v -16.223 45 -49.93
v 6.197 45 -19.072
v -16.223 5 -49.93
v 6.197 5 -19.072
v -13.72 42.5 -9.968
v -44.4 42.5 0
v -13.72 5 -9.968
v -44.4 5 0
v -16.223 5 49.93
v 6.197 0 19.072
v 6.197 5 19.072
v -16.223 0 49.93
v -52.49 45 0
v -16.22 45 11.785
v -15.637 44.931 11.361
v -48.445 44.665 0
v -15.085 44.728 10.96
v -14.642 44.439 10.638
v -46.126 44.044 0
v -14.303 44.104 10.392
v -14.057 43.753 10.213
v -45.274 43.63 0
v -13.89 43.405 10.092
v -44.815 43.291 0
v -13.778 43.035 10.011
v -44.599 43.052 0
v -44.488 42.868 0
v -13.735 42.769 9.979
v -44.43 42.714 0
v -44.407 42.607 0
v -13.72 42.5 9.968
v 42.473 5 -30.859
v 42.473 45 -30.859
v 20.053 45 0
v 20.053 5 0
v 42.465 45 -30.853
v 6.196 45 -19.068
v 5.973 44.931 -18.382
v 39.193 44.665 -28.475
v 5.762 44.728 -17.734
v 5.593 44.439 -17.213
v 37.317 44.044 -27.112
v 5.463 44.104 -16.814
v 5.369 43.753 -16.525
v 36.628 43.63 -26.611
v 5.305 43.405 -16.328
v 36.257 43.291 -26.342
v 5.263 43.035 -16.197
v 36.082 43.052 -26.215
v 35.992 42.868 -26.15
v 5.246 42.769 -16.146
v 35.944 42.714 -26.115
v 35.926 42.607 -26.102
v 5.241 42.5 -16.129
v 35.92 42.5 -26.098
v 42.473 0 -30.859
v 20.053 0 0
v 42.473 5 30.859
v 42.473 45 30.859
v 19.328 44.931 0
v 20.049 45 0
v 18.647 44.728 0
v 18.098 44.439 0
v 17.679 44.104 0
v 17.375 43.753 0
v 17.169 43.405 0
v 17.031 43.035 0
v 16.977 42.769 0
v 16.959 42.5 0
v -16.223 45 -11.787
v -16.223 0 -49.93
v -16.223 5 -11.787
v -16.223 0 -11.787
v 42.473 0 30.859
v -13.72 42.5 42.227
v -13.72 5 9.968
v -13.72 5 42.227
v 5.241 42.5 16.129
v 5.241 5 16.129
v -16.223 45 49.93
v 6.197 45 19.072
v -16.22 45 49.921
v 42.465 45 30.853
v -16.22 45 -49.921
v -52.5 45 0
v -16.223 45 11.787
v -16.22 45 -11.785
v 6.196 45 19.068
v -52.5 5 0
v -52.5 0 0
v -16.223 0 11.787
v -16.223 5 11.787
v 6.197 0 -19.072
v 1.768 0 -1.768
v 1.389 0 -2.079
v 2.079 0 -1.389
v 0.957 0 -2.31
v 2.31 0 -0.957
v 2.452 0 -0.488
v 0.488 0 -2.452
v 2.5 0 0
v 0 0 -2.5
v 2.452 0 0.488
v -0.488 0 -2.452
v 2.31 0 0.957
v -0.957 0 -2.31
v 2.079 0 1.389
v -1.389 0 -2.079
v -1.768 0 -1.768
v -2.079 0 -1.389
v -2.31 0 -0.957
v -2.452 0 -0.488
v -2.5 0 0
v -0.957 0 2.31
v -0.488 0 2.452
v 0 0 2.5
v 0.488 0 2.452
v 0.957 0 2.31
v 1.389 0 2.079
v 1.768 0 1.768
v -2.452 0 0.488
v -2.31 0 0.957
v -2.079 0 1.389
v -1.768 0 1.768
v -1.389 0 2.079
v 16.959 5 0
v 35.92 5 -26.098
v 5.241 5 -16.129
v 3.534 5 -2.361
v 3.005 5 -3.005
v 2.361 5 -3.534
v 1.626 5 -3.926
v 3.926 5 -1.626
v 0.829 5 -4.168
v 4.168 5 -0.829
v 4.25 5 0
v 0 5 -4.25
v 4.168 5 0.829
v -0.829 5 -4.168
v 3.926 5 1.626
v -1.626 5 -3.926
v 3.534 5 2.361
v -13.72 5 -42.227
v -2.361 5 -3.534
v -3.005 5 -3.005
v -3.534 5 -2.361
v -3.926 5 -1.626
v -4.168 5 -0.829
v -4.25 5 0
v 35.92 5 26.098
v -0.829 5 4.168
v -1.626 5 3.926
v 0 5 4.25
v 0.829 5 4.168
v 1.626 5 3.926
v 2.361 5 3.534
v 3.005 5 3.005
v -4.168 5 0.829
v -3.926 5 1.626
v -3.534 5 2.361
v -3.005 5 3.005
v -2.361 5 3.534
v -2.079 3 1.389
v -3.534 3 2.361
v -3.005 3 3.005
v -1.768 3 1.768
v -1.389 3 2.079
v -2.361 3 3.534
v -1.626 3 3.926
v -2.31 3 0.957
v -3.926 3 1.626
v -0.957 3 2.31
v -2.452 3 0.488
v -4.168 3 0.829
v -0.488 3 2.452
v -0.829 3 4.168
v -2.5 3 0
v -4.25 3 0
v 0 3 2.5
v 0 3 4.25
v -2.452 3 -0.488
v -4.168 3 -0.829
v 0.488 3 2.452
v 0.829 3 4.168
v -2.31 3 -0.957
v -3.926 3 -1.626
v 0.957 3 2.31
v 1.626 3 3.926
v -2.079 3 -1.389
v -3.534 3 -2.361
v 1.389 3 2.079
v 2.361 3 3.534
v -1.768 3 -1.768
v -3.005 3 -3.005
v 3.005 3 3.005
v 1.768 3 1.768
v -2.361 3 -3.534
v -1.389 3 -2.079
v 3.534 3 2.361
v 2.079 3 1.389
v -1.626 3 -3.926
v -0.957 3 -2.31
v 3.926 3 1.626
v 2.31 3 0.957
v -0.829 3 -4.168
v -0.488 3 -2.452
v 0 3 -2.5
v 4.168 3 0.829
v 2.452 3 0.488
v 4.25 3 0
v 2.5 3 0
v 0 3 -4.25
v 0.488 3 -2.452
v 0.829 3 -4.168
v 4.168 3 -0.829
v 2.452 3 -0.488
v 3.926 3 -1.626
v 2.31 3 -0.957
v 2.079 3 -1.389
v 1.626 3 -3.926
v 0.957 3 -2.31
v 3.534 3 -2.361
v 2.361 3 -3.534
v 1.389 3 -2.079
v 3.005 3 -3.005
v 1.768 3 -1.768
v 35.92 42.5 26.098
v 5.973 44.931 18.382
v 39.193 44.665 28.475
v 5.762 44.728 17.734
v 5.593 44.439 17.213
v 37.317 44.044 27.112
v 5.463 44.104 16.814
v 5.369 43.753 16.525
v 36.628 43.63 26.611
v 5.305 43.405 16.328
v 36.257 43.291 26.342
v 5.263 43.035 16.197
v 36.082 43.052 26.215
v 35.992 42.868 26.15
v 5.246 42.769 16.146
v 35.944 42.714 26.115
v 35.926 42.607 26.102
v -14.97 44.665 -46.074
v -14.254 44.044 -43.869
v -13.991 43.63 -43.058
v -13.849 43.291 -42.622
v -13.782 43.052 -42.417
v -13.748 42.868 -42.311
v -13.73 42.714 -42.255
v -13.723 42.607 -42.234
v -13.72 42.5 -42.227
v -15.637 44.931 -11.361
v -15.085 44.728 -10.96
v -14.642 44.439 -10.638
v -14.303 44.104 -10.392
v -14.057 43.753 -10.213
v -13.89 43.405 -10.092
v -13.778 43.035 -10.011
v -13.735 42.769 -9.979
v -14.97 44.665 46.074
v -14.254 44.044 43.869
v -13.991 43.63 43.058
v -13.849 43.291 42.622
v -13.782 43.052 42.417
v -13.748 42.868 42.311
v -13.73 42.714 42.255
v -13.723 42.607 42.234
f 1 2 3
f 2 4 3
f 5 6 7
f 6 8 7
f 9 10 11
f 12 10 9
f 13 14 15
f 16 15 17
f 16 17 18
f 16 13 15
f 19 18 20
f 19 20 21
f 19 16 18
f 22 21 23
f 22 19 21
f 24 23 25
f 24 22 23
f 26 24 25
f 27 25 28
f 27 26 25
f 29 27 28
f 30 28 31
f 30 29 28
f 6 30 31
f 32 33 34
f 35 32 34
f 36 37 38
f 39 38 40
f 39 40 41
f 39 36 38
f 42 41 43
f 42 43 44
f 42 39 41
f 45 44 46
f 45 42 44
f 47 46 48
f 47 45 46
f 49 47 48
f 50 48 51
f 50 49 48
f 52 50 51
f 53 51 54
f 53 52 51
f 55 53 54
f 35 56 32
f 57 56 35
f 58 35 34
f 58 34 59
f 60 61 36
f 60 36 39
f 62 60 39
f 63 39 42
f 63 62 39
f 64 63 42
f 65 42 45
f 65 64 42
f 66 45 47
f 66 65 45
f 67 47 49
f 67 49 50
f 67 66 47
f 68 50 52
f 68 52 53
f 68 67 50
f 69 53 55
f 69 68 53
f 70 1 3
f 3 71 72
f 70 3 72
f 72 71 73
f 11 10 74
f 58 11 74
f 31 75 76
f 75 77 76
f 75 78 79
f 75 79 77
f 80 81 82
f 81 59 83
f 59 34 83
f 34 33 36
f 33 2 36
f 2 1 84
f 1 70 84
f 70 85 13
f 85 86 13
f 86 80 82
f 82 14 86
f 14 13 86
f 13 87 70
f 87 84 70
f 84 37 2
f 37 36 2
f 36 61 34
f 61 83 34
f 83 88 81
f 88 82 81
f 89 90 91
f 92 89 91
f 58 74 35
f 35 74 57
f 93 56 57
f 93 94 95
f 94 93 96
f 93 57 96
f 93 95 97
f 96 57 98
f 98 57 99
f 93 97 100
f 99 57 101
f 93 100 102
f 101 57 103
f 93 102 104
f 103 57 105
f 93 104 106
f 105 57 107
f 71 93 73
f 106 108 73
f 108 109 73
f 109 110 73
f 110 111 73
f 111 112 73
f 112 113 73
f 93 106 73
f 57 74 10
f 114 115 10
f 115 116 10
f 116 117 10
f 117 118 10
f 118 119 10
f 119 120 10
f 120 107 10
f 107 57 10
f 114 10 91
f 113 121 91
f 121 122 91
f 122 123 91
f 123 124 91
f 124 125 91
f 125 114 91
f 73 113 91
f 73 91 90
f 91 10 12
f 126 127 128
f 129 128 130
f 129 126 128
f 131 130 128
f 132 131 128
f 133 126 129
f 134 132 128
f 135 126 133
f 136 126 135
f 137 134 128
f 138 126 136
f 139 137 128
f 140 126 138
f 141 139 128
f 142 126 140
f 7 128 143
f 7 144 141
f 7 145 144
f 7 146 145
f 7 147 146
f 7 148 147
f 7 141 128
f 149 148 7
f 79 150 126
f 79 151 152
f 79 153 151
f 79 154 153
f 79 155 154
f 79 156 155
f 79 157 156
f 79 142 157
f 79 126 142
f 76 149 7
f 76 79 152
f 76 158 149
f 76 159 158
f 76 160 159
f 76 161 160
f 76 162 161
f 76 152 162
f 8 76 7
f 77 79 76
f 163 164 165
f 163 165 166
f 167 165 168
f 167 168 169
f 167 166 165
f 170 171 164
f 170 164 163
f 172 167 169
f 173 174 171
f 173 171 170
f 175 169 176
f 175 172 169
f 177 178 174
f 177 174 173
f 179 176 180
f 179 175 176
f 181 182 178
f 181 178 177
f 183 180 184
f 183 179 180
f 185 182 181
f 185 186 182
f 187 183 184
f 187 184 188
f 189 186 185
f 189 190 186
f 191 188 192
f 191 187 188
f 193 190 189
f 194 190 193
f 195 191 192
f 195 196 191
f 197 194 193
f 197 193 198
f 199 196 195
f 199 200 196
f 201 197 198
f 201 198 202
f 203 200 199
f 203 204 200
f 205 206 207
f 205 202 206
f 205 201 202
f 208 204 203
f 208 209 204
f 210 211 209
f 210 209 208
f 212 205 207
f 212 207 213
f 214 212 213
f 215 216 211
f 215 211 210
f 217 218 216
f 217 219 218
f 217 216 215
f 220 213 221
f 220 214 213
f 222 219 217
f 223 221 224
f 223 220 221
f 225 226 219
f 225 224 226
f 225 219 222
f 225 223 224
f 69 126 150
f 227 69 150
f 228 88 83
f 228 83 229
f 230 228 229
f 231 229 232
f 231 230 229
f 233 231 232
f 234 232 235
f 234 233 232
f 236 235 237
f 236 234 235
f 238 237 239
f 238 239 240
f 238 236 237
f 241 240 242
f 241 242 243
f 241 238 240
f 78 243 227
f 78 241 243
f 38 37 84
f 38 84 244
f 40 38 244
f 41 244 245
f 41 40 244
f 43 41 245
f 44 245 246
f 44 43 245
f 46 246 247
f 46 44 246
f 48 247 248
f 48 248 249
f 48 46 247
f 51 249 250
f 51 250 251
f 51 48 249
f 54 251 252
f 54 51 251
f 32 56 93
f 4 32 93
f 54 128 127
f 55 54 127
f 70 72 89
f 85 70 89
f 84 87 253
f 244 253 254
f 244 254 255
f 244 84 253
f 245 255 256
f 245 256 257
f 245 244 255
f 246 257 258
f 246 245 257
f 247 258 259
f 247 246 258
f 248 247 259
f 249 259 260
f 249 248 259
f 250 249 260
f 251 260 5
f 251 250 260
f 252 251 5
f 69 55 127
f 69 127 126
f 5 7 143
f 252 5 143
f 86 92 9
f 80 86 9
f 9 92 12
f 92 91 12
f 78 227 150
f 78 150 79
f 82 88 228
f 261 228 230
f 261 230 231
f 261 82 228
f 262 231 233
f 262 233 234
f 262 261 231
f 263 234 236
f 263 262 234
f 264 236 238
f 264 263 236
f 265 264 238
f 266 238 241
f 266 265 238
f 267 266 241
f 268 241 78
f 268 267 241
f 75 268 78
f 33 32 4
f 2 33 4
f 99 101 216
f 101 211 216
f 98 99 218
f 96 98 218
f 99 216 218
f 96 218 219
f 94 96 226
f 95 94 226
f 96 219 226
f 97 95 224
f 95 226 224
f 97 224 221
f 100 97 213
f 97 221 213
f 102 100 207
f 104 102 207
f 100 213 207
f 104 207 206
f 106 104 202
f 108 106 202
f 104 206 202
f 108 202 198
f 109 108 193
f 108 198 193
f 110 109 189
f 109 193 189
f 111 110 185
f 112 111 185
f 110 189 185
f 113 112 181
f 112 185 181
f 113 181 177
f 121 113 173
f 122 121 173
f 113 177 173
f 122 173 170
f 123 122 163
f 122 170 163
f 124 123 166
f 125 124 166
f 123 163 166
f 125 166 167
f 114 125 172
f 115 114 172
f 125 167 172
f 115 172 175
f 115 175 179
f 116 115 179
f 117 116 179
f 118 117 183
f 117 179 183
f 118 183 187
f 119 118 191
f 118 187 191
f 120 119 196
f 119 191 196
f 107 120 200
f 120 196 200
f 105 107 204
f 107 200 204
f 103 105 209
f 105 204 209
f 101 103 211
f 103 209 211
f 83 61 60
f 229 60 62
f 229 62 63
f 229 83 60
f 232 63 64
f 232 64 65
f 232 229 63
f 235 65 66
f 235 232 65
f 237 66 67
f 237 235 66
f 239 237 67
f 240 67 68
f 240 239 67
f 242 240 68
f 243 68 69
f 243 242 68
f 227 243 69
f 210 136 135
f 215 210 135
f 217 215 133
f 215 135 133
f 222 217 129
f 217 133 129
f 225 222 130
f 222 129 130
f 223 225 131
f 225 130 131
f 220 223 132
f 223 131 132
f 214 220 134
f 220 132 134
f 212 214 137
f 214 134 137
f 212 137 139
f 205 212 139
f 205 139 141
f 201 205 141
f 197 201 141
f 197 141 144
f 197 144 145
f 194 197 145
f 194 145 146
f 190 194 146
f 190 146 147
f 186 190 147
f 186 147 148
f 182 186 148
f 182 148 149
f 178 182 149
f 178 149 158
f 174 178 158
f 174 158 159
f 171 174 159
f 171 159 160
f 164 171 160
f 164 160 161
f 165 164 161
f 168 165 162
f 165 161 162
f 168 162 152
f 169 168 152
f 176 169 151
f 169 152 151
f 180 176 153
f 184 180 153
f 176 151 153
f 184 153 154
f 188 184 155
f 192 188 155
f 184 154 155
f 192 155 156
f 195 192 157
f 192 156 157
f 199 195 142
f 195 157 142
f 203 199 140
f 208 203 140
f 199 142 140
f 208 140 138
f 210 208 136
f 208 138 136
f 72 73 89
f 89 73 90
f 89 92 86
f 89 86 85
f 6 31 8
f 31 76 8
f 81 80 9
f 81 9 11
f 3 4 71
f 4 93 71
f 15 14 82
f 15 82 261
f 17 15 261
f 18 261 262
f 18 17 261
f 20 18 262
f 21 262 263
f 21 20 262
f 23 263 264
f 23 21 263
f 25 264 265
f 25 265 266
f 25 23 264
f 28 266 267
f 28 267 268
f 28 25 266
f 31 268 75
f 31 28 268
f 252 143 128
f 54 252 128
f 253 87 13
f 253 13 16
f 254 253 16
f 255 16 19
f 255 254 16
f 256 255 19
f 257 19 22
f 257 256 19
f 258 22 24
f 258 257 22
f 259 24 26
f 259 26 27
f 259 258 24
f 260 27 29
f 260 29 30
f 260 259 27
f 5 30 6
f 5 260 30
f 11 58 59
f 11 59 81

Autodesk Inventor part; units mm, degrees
ref_plane "YZ Plane" through (0, 0, 0) normal (1, 0, 0) x (0, 1, 0)
ref_plane "XZ Plane" through (0, 0, 0) normal (0, 1, 0) x (-1, 0, 0)
ref_plane "XY Plane" through (0, 0, 0) normal (0, 0, 1) x (1, 0, 0)
sketch "Sketch1" plane through (0, 0, 0) normal (0, 1, 0) x (-1, 0, 0)
  circle A0 centre (0, 0) radius 52.5
  line L0 (52.5, 0) -> (16.2234, -49.9305)
  line L1 (16.2234, -49.9305) -> (-42.4734, -30.8587)
  line L2 (-42.4734, -30.8587) -> (-42.4734, 30.8587)
  line L3 (-42.4734, 30.8587) -> (16.2234, 49.9305)
  line L4 (16.2234, 49.9305) -> (52.5, 0)
  line L5 (52.5, 0) -> (-42.4734, 30.8587)
  line L6 (-42.4734, -30.8587) -> (52.5, 0)
  line L7 (16.2234, -49.9305) -> (16.2234, 49.9305)
  line L8 (-42.4734, -30.8587) -> (16.2234, 49.9305)
  line L9 (-42.4734, 30.8587) -> (16.2234, -49.9305)
  point P0 (16.2234, -11.787)
  point P1 (16.2234, 11.787)
  point P2 (-6.1968, 19.0717)
  point P3 (-20.0532, 0)
  point P4 (-6.1968, -19.0717)
extrude "Extrusion1" add sketch "Sketch1" along normal blind 5 contours L6 L7 L5 | L7 L5 L8 | L9 L6 L7 | L7 L6 L9 L8 L5 | L5 L8 L9 | L8 L9 L6
sketch "Sketch2" plane through (0, 5, 0) normal (0, 1, 0) x (1, 0, 0)
  circle A0 centre (0, 0) radius 4.25
  dimension "d3" = 8.5
extrude "Extrusion2" cut sketch "Sketch2" against normal blind 2
sketch "Sketch3" plane through (0, 3, 0) normal (0, 1, 0) x (1, 0, 0)
  circle A0 centre (0, 0) radius 2.5
  dimension "d6" = 5
extrude "Extrusion3" cut sketch "Sketch3" against normal through all
sketch "Sketch4" plane through (0, 5, 0) normal (0, 1, 0) x (1, 0, 0)
  line L0 (-16.2234, 11.787) -> (-52.5, 0) projected
  line L1 (-52.5, 0) -> (-16.2234, 11.787)
  line L2 (6.1968, 19.0717) -> (-16.2234, 49.9305) projected
  line L3 (-16.2234, 11.787) -> (-16.2234, 49.9305)
  line L4 (-16.2234, 49.9305) -> (6.1968, 19.0717)
  line L5 (42.4734, 30.8587) -> (6.1968, 19.0717) projected
  line L6 (6.1968, 19.0717) -> (42.4734, 30.8587)
  line L7 (42.4734, 30.8587) -> (20.0532, 0)
  line L8 (20.0532, 0) -> (42.4734, -30.8587)
  line L9 (-16.2234, -49.9305) -> (6.1968, -19.0717) projected
  line L10 (42.4734, -30.8587) -> (6.1968, -19.0717)
  line L11 (6.1968, -19.0717) -> (-16.2234, -49.9305)
  line L12 (-16.2234, -11.787) -> (-16.2234, -49.9305) projected
  line L13 (-16.2234, -49.9305) -> (-16.2234, -11.787)
  line L14 (-16.2234, -11.787) -> (-52.5, 0)
  line L15 (-52.5, 0) -> (-16.2234, -11.787) projected
  line L16 (-16.2234, -49.9305) -> (-15.4508, -47.5528)
  line L17 (-52.5, 0) -> (-44.4, 0)
  line L18 (-44.4, 0) -> (-13.7204, 42.2269)
  line L19 (-13.7204, 42.2269) -> (35.9204, 26.0977)
  line L20 (35.9204, 26.0977) -> (35.9204, -26.0977)
  line L21 (35.9204, -26.0977) -> (-13.7204, -42.2269)
  line L22 (-13.7204, -42.2269) -> (-44.4, 0)
  line L23 (-44.4, 0) -> (-13.7204, -42.2269)
  line L24 (-13.7204, -42.2269) -> (-13.7204, 42.2269)
  line L25 (-16.2234, -11.787) -> (-16.2234, -49.9305) projected
  line L26 (-13.7204, 42.2269) -> (35.9204, -26.0977)
  line L27 (35.9204, -26.0977) -> (-44.4, 0)
  line L28 (-44.4, 0) -> (35.9204, 26.0977)
  line L29 (35.9204, 26.0977) -> (-13.7204, -42.2269)
  line L30 (-16.2234, -49.9305) -> (6.1968, -19.0717) projected
  point P0 (0, 0)
  point P1 (0, 0)
  point P2 (5.2407, 16.1292)
  point P3 (16.9593, 0)
  point P4 (5.2407, -16.1292)
  point P5 (-13.7204, -9.9684)
  point P6 (-13.7204, 9.9684)
  dimension "d10" = 2.5
  dimension "d11" = 8.1
extrude "Extrusion4" add sketch "Sketch4" along normal blind 40 contours L3 L18 L24 L28 L0 | L18 L17 L0 | L3 L2 L19 L18 | L17 L22 L14 | L27 L24 L22 L12 L14 | L19 L2 L5 L28 L26 | L22 L21 L9 L12 | L29 L27 L21 L10 L9 | L5 L7 L20 L19 | L29 L20 L7 L8 L26 | L20 L8 L10 L21
fillet "Fillet1" radius 2.5 10 edges at (-13.7204, 45, 26.0977) (-29.0602, 45, 4.9842) (-29.0602, 45, -4.9842) (-13.7204, 45, -26.0977) (-4.2398, 45, -29.1781) (20.5805, 45, -21.1135) (26.4398, 45, -13.0488) (26.4398, 45, 13.0488) (20.5805, 45, 21.1135) (-4.2398, 45, 29.1781)
properties part number "StarP"
